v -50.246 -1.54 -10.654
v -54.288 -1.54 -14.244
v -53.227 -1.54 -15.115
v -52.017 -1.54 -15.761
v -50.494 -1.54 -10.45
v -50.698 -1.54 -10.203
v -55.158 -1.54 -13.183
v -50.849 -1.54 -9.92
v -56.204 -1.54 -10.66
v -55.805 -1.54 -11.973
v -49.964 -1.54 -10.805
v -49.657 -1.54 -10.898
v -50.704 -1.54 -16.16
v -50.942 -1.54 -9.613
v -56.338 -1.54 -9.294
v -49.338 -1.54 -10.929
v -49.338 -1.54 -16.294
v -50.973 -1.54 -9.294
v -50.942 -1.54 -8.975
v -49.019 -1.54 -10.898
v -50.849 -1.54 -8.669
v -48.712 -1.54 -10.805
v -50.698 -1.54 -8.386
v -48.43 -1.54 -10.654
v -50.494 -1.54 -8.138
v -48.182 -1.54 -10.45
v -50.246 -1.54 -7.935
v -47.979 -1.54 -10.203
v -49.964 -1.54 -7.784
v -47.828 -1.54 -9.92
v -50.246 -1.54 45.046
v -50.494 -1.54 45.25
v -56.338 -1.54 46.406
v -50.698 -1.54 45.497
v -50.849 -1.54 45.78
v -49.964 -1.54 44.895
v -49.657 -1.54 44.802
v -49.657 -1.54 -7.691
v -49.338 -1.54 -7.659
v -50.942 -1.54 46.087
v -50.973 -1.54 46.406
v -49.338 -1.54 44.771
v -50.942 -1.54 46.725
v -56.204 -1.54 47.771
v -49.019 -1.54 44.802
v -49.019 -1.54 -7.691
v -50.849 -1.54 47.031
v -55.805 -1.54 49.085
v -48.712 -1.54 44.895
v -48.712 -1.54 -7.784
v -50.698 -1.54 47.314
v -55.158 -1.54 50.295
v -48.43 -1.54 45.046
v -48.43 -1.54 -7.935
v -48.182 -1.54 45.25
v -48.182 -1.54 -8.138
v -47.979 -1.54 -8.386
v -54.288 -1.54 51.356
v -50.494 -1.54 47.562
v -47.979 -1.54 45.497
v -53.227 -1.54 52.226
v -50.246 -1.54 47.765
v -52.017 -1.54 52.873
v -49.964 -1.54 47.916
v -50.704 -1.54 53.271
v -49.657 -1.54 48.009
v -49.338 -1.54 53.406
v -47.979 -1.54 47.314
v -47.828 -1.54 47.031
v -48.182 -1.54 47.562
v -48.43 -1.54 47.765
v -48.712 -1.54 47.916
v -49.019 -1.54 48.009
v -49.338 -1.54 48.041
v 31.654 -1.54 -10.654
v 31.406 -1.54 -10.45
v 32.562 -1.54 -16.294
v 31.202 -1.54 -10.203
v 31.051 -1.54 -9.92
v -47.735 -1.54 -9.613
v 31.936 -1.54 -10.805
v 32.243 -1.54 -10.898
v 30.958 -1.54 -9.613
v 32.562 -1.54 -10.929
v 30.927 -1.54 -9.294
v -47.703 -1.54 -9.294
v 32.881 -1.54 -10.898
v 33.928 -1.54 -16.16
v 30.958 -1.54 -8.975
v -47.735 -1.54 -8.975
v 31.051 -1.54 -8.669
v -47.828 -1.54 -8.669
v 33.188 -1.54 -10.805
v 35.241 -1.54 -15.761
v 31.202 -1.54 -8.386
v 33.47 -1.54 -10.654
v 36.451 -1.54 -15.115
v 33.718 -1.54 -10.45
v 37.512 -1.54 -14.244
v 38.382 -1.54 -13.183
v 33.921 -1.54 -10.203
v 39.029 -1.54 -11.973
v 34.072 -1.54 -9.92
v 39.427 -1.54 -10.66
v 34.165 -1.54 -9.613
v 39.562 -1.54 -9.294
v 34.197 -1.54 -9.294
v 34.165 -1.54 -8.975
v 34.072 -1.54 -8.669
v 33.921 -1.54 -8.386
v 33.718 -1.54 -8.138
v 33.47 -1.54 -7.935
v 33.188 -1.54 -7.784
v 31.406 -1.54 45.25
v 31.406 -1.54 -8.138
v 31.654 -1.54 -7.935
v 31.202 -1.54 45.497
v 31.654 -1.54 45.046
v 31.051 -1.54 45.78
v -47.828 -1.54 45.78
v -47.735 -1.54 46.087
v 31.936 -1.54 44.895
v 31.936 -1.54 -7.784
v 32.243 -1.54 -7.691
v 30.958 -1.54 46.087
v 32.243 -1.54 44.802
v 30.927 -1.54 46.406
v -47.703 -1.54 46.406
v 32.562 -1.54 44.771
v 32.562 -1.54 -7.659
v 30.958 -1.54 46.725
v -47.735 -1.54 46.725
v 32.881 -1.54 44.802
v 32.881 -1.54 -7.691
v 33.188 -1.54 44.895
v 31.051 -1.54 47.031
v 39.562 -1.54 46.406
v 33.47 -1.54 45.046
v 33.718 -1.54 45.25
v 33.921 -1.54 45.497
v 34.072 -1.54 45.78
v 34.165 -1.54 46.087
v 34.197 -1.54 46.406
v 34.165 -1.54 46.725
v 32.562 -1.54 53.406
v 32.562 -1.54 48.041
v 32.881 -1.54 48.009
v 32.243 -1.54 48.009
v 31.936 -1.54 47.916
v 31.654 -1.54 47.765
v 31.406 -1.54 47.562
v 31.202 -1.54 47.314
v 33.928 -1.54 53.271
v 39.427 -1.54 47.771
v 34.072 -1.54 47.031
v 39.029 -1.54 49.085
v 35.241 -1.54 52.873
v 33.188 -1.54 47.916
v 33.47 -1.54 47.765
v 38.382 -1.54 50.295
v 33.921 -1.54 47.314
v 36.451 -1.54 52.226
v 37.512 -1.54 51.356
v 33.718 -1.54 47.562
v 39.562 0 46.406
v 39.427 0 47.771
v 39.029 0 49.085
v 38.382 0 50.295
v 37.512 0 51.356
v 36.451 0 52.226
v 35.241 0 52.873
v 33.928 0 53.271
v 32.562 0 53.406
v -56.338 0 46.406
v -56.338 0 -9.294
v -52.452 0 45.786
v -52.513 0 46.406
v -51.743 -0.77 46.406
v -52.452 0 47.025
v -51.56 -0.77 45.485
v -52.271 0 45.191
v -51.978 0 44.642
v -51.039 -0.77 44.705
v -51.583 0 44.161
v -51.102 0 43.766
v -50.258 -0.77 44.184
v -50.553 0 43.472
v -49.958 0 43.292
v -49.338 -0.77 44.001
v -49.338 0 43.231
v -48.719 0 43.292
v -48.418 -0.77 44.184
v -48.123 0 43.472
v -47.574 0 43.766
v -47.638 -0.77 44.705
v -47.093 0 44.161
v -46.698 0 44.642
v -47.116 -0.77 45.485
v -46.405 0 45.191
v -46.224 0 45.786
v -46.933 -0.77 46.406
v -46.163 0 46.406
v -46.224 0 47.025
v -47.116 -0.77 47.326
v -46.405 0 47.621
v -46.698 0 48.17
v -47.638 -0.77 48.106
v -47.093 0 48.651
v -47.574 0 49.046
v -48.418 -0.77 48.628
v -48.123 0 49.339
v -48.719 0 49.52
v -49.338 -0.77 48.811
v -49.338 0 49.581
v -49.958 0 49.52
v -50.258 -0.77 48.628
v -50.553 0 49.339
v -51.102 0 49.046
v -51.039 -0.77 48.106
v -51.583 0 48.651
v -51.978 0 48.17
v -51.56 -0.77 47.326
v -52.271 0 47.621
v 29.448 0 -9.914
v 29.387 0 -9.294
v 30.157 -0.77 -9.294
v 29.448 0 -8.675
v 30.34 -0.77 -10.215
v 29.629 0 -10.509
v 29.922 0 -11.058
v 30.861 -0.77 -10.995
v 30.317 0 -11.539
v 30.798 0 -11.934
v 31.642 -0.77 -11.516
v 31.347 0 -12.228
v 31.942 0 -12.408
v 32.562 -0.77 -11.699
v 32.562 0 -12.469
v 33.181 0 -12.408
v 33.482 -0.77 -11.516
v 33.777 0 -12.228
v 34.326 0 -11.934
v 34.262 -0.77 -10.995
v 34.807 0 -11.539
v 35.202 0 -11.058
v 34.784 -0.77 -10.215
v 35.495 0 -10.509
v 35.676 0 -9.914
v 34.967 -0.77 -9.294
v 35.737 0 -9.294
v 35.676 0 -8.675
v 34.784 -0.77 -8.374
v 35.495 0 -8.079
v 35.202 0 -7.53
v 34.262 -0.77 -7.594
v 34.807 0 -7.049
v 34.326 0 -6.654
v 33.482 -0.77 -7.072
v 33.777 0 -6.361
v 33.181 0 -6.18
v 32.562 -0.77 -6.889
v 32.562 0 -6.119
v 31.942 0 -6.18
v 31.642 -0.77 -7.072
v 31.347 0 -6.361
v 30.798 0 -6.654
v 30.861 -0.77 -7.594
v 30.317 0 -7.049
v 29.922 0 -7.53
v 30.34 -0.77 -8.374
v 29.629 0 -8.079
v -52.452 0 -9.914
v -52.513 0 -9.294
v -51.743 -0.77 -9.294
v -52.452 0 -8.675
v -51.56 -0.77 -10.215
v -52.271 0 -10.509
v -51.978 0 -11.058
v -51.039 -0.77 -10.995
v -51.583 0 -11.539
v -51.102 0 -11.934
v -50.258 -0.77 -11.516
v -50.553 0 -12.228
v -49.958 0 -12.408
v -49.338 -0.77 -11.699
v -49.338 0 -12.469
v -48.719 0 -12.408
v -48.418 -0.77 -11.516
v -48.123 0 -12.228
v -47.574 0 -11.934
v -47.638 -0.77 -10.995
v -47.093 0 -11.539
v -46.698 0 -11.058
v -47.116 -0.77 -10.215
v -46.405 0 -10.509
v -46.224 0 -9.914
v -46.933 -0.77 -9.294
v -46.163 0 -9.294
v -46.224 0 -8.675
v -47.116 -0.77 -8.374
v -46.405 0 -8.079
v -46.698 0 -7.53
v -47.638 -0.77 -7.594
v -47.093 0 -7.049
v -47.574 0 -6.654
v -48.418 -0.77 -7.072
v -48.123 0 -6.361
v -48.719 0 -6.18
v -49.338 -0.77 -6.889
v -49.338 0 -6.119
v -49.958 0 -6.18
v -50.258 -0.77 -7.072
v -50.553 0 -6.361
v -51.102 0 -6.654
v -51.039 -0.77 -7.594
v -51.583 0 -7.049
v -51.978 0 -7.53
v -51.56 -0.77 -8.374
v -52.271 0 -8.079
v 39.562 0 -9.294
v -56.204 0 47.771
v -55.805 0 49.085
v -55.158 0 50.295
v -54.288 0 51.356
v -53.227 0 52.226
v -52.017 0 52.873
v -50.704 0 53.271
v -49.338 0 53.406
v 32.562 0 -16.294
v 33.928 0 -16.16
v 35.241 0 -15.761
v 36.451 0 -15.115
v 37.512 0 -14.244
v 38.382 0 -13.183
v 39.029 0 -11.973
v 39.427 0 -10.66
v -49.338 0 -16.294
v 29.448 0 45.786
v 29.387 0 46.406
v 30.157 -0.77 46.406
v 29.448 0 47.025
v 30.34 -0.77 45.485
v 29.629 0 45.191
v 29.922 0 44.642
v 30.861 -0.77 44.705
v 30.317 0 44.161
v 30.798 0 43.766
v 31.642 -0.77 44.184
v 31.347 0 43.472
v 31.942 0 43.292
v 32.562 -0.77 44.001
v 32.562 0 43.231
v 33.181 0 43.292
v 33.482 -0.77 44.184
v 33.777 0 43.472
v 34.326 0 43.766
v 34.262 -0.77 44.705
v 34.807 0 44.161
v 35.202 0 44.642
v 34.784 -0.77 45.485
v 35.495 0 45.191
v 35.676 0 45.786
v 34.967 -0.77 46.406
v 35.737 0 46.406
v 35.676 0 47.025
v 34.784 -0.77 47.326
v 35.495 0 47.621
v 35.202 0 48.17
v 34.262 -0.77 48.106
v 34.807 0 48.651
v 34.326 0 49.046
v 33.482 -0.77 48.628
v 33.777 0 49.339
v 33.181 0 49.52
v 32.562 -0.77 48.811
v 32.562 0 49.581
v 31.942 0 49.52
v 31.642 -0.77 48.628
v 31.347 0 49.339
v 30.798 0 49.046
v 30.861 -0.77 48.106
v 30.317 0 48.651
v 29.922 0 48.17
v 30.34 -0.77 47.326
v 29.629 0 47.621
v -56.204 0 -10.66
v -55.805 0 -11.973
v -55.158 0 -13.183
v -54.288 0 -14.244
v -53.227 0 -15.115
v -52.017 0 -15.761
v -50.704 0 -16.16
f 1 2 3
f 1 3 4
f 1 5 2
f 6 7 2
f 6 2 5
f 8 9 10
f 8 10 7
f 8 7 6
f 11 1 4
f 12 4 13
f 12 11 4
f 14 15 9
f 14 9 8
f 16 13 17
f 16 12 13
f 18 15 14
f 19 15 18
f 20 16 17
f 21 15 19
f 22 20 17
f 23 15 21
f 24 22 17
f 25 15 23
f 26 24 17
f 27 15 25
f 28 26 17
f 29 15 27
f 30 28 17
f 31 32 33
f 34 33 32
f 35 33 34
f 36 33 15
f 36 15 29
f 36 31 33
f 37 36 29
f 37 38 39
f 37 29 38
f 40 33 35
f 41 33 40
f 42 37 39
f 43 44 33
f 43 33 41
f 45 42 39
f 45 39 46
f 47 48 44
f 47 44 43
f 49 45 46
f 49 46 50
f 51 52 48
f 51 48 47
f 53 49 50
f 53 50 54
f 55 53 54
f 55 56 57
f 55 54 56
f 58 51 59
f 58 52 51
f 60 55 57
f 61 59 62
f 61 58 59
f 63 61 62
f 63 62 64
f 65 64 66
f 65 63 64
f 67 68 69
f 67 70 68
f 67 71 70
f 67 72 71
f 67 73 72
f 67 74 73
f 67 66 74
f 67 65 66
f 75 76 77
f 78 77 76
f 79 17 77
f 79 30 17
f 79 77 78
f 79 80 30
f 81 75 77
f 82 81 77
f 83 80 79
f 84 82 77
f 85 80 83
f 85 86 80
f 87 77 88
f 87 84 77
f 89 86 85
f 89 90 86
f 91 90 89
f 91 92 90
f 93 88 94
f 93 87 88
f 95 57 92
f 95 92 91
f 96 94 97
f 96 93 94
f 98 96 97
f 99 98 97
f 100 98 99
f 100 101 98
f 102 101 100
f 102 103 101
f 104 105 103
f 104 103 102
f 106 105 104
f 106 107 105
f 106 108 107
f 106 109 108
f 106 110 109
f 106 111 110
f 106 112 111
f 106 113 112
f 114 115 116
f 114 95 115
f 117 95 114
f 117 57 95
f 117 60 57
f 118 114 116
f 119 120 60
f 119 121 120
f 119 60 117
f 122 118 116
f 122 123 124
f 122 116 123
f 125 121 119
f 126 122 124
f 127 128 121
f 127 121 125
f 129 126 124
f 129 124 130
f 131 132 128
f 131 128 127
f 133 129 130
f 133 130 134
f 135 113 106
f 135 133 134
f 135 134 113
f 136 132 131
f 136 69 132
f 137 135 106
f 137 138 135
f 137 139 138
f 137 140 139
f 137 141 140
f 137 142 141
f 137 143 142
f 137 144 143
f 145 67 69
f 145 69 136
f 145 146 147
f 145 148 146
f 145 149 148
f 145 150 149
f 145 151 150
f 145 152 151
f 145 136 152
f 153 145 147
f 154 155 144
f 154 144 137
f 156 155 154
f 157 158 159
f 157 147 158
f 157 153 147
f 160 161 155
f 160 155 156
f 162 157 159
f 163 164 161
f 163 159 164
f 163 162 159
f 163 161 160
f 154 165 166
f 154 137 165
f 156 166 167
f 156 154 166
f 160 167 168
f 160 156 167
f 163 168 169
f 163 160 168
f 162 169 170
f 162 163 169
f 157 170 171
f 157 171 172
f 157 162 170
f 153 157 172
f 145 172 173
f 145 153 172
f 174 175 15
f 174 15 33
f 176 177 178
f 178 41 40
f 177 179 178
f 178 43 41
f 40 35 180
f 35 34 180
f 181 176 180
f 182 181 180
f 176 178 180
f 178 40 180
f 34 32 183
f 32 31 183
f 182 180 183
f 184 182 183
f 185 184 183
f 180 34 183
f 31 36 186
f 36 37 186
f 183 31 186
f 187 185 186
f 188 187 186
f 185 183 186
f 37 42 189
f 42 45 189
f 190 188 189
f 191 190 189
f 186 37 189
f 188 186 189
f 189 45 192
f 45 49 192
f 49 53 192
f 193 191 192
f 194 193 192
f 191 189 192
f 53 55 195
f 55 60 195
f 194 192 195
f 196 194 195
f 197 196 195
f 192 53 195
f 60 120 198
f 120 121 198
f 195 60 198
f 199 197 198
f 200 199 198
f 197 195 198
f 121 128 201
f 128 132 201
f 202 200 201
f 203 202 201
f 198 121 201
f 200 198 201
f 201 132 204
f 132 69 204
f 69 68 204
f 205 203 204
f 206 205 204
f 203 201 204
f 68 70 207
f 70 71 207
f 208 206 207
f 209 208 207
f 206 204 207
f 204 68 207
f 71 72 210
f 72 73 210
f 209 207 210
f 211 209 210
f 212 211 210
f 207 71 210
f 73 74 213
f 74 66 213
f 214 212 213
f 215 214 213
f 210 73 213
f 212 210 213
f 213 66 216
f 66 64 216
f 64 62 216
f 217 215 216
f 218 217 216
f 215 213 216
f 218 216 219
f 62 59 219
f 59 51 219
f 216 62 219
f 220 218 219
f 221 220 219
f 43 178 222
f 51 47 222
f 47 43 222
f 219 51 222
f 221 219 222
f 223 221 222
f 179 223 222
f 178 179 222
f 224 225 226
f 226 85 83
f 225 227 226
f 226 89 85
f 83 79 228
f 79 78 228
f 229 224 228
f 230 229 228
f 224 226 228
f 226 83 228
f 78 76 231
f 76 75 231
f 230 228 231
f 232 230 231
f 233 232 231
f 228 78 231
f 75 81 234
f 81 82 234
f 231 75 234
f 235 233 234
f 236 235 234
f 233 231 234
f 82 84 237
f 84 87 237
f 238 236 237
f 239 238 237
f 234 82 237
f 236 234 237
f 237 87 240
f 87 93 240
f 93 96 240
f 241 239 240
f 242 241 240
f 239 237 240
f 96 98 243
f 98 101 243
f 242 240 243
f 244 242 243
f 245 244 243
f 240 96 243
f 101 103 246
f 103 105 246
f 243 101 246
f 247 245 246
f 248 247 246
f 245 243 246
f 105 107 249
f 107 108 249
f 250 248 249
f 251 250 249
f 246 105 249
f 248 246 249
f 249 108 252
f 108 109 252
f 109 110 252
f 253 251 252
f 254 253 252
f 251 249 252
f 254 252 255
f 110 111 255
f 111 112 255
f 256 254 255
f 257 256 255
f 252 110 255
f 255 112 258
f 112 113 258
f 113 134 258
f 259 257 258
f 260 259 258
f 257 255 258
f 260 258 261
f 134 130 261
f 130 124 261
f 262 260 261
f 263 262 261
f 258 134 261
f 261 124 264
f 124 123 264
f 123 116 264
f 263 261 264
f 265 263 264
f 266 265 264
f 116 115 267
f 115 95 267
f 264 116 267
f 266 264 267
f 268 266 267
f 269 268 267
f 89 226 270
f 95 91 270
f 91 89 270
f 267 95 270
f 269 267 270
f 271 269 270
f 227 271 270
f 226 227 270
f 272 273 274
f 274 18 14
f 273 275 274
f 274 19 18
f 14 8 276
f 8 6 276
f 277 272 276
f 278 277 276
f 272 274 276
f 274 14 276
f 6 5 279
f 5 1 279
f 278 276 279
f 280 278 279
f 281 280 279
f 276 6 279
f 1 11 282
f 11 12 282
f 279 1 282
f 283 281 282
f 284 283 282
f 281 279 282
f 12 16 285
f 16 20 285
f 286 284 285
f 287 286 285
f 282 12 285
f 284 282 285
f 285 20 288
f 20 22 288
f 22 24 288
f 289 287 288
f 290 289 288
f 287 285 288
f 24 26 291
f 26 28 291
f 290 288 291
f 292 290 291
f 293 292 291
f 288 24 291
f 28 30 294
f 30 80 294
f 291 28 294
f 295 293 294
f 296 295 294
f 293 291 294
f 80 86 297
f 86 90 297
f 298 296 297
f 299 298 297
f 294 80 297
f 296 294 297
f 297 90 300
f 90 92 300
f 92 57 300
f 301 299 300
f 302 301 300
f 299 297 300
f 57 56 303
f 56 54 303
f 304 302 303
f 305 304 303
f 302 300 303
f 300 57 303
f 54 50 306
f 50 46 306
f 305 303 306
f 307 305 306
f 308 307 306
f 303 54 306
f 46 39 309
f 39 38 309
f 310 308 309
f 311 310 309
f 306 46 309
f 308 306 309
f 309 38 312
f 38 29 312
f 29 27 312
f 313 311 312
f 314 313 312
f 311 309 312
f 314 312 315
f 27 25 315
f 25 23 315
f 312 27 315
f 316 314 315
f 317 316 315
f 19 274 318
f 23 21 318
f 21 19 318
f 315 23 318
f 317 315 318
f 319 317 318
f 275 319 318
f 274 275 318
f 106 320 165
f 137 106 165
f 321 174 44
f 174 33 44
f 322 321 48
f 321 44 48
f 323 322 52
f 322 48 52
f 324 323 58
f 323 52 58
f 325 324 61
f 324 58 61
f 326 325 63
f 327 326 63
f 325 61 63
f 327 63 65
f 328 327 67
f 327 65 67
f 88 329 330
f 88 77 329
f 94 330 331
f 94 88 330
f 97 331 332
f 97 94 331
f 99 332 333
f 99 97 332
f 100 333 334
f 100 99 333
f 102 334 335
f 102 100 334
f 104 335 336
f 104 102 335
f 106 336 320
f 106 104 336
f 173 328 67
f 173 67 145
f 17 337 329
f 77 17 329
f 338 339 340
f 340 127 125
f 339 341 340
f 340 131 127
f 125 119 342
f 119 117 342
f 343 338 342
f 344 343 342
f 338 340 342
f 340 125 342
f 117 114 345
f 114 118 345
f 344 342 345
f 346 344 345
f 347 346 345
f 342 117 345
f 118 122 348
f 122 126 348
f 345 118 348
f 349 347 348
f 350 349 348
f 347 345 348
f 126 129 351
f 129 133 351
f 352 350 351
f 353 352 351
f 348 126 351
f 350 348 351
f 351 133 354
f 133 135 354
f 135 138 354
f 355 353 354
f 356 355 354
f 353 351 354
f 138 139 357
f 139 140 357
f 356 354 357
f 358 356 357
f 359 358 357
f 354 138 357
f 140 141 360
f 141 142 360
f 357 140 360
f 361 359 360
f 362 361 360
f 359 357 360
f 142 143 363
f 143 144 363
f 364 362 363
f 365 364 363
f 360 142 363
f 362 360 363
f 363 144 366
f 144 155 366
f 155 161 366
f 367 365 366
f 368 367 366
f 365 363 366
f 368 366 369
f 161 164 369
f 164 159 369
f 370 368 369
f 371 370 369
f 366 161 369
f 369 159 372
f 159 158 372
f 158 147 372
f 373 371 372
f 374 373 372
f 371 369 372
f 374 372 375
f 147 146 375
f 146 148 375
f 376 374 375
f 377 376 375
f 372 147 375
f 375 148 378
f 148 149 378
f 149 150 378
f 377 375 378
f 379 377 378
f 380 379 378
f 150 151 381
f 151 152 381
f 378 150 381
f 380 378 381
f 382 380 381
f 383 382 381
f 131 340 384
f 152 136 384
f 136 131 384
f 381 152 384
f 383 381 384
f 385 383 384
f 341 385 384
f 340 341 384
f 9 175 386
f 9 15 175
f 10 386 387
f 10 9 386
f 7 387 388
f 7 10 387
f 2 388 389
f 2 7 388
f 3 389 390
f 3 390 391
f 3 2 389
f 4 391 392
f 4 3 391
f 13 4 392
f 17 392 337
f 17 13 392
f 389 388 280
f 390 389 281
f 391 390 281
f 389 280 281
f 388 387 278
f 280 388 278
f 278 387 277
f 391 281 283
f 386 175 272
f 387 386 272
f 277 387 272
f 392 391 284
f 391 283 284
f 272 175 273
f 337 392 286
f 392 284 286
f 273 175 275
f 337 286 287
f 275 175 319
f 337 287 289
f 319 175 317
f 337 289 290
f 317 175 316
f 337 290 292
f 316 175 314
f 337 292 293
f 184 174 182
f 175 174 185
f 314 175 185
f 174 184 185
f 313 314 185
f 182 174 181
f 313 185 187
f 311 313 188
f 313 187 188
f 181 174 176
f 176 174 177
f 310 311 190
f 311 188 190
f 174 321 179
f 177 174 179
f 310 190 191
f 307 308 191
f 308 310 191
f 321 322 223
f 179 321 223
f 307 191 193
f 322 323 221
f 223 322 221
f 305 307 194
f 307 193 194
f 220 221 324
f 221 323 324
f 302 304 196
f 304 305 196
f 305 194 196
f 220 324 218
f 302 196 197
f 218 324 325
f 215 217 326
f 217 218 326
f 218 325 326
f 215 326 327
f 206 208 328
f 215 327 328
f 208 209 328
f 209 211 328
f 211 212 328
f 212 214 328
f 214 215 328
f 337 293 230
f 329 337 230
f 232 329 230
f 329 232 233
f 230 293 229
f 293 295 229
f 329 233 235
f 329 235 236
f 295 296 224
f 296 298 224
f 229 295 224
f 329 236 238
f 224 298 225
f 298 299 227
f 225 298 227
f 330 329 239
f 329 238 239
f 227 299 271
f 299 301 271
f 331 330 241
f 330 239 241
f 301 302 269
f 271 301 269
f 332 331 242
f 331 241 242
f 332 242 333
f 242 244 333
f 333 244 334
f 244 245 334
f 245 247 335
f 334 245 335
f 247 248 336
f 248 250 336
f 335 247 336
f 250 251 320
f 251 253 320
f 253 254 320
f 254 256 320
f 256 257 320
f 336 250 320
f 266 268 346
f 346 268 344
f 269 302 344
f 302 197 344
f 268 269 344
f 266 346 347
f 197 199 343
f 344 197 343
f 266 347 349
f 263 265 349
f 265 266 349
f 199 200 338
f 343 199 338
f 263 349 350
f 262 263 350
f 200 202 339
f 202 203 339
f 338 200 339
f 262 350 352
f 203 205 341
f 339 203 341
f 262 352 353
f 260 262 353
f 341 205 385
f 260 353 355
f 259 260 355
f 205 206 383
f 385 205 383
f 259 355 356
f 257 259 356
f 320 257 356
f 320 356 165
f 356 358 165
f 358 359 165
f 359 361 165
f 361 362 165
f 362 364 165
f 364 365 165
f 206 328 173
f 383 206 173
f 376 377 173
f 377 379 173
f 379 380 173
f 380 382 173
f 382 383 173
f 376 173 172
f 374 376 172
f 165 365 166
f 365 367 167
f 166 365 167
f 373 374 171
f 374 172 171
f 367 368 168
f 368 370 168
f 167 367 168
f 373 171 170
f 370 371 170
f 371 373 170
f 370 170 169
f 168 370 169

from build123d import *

# Parameters (mm, degrees)
F0_W           = 95.9
F0_H           = 69.7
F1_DEPTH       = 1.54
F2_R           = 7
F3_D           = 2.8448
F3_CSINK_D     = 6.35
F3_CSINK_ANGLE = 90


with BuildPart() as f1:
    # F0 (on Front) → F1 (new body)
    with BuildSketch(Plane.XZ):
        with Locations((-8.388126269, 18.5557605668)):
            Rectangle(F0_W, F0_H)
    extrude(amount=F1_DEPTH)

    # F2
    f2_edges = [f1.edges().sort_by_distance(p)[0] for p in [
        (-56.338126, -0.77, -16.294239),
        (39.561874, -0.77, -16.294239),
        (39.561874, -0.77, 53.405761),
        (-56.338126, -0.77, 53.405761),
    ]]
    fillet(f2_edges, radius=F2_R)

    # F3 (through all)
    with Locations(Plane(origin=(0, 0, 0), x_dir=(1, 0, 0), z_dir=(0, 1, 0))):
        with Locations((-49.338126269, -46.4057605668), (32.561873731, -46.4057605668), (32.561873731, 9.2942394332), (-49.338126269, 9.2942394332)):
            CounterSinkHole(F3_D / 2, F3_CSINK_D / 2, counter_sink_angle=F3_CSINK_ANGLE)


solid = f1.part
